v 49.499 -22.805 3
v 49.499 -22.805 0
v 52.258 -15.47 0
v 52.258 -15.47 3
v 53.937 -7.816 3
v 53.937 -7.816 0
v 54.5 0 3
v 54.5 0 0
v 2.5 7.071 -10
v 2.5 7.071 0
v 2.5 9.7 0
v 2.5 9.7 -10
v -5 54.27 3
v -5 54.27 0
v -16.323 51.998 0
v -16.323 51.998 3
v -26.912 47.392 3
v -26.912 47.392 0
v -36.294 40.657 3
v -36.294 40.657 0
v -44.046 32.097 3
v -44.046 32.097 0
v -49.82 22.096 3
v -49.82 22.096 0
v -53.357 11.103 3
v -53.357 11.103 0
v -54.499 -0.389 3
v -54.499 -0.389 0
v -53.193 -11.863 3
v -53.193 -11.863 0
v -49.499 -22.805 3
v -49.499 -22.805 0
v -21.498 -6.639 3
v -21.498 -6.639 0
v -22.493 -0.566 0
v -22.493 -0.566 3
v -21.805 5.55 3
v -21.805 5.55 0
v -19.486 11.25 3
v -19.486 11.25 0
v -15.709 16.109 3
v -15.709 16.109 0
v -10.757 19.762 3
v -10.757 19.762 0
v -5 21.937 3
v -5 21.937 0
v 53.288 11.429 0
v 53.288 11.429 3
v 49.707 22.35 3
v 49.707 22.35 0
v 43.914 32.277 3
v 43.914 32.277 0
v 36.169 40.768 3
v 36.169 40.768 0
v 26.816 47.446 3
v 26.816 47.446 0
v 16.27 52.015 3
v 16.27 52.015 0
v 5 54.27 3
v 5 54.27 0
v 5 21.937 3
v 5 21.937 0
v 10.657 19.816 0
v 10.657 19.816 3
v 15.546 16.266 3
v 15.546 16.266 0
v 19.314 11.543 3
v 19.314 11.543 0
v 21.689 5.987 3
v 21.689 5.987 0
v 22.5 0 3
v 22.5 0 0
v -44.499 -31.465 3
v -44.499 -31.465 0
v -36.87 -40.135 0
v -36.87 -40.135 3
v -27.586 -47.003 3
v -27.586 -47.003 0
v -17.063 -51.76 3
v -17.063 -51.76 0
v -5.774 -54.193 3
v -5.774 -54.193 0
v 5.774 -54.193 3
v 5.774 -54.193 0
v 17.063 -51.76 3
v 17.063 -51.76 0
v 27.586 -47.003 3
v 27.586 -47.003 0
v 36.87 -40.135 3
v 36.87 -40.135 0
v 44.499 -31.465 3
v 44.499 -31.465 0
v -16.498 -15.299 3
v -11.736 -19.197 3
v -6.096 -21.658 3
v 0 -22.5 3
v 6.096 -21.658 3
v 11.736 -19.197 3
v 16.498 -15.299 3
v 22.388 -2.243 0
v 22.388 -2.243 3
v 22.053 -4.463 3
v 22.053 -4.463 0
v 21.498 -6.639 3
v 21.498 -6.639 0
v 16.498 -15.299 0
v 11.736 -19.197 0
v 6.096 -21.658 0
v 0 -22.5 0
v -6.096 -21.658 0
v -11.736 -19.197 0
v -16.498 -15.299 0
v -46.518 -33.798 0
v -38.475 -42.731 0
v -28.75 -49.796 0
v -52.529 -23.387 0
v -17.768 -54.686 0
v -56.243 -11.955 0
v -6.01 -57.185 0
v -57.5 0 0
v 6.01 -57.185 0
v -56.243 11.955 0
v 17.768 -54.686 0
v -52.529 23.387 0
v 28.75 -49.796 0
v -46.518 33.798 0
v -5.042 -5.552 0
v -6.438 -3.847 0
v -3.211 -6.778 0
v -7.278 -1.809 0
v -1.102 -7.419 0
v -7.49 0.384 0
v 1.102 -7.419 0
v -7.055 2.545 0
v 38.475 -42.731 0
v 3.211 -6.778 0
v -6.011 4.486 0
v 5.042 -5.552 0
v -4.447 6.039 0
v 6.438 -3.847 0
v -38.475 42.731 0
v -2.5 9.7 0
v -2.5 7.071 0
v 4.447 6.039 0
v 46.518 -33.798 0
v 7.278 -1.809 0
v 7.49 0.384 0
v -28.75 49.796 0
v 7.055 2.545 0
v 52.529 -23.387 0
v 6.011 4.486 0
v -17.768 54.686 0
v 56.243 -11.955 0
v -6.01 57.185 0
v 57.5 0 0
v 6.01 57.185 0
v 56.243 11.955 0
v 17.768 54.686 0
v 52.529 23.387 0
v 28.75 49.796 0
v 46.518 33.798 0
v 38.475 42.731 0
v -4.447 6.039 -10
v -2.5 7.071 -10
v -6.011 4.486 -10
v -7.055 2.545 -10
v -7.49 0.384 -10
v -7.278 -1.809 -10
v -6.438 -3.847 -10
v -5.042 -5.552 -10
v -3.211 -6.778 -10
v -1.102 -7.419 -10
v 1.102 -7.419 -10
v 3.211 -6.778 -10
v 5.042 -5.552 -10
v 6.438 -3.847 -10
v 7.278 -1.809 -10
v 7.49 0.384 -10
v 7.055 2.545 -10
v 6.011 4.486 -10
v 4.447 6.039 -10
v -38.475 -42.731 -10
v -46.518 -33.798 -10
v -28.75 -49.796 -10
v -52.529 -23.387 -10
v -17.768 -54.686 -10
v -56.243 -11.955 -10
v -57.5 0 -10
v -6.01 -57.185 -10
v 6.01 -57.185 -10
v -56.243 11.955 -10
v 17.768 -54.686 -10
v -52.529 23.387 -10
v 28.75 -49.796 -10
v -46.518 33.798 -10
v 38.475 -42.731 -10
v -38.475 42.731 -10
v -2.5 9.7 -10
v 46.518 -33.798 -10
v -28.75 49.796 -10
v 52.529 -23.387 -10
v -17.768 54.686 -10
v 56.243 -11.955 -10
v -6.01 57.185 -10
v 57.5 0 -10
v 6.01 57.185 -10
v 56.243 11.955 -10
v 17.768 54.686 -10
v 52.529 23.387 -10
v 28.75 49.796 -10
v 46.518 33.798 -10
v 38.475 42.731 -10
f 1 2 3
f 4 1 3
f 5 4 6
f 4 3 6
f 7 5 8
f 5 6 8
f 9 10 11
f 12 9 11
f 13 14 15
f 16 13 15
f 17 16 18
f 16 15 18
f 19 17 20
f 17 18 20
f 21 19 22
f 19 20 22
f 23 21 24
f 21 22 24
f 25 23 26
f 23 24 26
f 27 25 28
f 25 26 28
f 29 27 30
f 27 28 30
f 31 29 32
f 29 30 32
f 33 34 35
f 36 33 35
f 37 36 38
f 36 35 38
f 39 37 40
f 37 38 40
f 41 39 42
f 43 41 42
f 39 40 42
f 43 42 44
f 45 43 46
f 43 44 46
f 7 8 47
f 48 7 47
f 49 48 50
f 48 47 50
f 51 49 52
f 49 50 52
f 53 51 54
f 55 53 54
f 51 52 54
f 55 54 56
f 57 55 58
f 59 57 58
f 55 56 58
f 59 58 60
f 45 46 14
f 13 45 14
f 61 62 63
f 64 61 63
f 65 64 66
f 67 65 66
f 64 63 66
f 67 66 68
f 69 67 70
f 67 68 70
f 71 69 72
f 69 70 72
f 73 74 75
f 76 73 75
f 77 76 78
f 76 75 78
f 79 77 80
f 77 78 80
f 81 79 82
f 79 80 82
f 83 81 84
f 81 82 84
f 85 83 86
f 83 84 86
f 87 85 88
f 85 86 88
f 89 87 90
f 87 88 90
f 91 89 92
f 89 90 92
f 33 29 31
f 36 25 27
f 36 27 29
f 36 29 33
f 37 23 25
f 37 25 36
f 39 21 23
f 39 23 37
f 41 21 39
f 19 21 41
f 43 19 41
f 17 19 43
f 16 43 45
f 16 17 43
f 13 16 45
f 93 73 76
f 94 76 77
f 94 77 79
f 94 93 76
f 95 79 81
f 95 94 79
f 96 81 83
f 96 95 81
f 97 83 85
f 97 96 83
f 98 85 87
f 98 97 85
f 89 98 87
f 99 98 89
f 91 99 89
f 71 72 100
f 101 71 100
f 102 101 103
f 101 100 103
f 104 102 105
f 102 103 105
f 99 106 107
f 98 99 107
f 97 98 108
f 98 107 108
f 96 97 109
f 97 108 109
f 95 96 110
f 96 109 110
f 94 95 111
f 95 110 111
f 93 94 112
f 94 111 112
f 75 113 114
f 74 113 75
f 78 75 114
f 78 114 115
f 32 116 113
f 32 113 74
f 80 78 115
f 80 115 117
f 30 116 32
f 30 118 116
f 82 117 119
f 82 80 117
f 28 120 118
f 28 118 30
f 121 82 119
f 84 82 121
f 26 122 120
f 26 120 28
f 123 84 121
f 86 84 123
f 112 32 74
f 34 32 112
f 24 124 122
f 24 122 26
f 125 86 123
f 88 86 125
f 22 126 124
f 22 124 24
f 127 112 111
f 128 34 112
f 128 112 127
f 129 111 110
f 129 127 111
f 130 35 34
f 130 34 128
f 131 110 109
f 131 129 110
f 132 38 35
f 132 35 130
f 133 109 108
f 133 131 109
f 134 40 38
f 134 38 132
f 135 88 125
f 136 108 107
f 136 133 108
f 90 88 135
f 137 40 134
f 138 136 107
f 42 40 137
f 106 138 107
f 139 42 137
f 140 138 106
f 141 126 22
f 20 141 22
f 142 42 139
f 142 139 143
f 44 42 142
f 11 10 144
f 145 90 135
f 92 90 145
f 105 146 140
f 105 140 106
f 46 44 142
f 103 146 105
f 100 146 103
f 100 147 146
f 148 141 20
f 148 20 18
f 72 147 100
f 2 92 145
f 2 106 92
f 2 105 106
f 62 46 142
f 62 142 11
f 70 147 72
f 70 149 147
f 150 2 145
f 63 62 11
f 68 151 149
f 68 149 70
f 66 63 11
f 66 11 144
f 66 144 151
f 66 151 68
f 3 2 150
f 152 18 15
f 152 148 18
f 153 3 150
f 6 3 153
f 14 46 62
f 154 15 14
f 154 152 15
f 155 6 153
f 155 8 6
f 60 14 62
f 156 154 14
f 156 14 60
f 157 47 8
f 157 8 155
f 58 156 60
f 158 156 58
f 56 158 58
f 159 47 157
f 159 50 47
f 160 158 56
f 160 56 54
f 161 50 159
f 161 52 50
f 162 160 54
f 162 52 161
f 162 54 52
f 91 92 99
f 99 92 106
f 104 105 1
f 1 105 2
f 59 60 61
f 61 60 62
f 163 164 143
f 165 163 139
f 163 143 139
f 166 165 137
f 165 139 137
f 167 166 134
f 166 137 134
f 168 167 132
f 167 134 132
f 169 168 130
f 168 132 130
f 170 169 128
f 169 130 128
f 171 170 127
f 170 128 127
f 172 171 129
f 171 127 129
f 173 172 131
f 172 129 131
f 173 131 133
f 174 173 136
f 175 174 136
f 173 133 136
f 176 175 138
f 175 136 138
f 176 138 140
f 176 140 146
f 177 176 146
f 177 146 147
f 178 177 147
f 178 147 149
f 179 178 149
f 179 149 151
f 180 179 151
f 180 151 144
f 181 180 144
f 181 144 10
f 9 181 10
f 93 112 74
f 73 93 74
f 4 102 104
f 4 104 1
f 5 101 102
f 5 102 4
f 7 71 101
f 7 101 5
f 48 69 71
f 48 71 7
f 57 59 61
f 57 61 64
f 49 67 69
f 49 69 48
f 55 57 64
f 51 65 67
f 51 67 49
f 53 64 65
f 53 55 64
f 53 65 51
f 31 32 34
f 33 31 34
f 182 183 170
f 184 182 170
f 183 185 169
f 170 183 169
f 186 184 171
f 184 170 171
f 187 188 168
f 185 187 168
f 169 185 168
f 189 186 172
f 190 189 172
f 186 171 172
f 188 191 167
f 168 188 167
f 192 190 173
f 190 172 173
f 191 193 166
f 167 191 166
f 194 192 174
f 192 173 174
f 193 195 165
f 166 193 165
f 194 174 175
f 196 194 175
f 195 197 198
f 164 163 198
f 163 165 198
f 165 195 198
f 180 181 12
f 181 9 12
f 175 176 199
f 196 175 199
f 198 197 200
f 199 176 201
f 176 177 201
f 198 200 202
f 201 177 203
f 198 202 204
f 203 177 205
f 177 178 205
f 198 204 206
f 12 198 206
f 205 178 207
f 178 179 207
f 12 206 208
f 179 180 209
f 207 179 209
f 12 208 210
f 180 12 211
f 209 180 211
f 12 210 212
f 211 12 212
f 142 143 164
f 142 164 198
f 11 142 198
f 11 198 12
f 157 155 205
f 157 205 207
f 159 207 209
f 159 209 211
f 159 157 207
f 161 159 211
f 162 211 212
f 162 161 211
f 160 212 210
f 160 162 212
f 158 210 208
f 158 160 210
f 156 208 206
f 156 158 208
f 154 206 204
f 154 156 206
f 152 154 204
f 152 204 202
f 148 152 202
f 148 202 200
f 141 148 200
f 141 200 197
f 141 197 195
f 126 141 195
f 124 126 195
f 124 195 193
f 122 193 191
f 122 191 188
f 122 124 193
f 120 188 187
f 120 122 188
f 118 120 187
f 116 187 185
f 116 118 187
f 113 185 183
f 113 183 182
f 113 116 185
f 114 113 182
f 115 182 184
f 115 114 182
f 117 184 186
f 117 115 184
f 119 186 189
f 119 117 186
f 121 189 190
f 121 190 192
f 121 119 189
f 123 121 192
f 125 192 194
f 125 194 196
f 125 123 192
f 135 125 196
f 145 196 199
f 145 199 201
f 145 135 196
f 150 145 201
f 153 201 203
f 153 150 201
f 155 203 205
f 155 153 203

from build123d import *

# Parameters (mm, degrees)
ESBO_O1_R             = 57.5
ESBO_O1_R_2           = 7.5
EXTRUS_O1_DEPTH       = 10
EXTRUS_O2_DEPTH       = 3
ESBO_O3_W             = 5
ESBO_O3_H             = 9.7
CORTE_EXTRUS_O1_DEPTH = 82.929848041


with BuildPart() as part:
    # Esboço1 → Extrusão1 (new body)
    with BuildSketch(Plane.XY):
        Circle(ESBO_O1_R)
        Circle(ESBO_O1_R_2, mode=Mode.SUBTRACT)
    extrude(amount=-EXTRUS_O1_DEPTH)

    # Esboço2 → Extrusão2 (add)
    with BuildSketch(Plane.XY):
        with BuildLine():
            Line((5, 54.270157545), (5, 21.937410968))
            ThreePointArc((5, 21.937410968), (17.589059099, 14.0312152), (22.5, 0))
            ThreePointArc((22.5, 0), (22.248179609, -3.35685926), (21.498355192, -6.638578465))
            Line((21.498355192, -6.638578465), (49.499335102, -22.804951754))
            ThreePointArc((49.499335102, -22.804951754), (53.235156443, -11.673393615), (54.5, 0))
            ThreePointArc((54.5, 0), (40.266301047, 36.72703364), (5, 54.270157545))
        make_face()
        with BuildLine():
            ThreePointArc((-21.498355192, -6.638578465), (-19.485571585, 11.25), (-5, 21.937410968))
            Line((-5, 21.937410968), (-5, 54.270157545))
            ThreePointArc((-5, 54.270157545), (-47.198384506, 27.25), (-49.499335102, -22.804951754))
            Line((-49.499335102, -22.804951754), (-21.498355192, -6.638578465))
        make_face()
        with BuildLine():
            Line((44.499335102, -31.465205792), (16.498355192, -15.298832503))
            ThreePointArc((16.498355192, -15.298832503), (0, -22.5), (-16.498355192, -15.298832503))
            Line((-16.498355192, -15.298832503), (-44.499335102, -31.465205792))
            ThreePointArc((-44.499335102, -31.465205792), (0, -54.5), (44.499335102, -31.465205792))
        make_face()
    extrude(amount=EXTRUS_O2_DEPTH)

    # Esboço3 → Corte-extrusão1 (cut, through all)
    with BuildSketch(Plane.XY):
        with Locations((0, 4.85)):
            Rectangle(ESBO_O3_W, ESBO_O3_H)
    extrude(amount=-CORTE_EXTRUS_O1_DEPTH, mode=Mode.SUBTRACT)


solid = part.part
